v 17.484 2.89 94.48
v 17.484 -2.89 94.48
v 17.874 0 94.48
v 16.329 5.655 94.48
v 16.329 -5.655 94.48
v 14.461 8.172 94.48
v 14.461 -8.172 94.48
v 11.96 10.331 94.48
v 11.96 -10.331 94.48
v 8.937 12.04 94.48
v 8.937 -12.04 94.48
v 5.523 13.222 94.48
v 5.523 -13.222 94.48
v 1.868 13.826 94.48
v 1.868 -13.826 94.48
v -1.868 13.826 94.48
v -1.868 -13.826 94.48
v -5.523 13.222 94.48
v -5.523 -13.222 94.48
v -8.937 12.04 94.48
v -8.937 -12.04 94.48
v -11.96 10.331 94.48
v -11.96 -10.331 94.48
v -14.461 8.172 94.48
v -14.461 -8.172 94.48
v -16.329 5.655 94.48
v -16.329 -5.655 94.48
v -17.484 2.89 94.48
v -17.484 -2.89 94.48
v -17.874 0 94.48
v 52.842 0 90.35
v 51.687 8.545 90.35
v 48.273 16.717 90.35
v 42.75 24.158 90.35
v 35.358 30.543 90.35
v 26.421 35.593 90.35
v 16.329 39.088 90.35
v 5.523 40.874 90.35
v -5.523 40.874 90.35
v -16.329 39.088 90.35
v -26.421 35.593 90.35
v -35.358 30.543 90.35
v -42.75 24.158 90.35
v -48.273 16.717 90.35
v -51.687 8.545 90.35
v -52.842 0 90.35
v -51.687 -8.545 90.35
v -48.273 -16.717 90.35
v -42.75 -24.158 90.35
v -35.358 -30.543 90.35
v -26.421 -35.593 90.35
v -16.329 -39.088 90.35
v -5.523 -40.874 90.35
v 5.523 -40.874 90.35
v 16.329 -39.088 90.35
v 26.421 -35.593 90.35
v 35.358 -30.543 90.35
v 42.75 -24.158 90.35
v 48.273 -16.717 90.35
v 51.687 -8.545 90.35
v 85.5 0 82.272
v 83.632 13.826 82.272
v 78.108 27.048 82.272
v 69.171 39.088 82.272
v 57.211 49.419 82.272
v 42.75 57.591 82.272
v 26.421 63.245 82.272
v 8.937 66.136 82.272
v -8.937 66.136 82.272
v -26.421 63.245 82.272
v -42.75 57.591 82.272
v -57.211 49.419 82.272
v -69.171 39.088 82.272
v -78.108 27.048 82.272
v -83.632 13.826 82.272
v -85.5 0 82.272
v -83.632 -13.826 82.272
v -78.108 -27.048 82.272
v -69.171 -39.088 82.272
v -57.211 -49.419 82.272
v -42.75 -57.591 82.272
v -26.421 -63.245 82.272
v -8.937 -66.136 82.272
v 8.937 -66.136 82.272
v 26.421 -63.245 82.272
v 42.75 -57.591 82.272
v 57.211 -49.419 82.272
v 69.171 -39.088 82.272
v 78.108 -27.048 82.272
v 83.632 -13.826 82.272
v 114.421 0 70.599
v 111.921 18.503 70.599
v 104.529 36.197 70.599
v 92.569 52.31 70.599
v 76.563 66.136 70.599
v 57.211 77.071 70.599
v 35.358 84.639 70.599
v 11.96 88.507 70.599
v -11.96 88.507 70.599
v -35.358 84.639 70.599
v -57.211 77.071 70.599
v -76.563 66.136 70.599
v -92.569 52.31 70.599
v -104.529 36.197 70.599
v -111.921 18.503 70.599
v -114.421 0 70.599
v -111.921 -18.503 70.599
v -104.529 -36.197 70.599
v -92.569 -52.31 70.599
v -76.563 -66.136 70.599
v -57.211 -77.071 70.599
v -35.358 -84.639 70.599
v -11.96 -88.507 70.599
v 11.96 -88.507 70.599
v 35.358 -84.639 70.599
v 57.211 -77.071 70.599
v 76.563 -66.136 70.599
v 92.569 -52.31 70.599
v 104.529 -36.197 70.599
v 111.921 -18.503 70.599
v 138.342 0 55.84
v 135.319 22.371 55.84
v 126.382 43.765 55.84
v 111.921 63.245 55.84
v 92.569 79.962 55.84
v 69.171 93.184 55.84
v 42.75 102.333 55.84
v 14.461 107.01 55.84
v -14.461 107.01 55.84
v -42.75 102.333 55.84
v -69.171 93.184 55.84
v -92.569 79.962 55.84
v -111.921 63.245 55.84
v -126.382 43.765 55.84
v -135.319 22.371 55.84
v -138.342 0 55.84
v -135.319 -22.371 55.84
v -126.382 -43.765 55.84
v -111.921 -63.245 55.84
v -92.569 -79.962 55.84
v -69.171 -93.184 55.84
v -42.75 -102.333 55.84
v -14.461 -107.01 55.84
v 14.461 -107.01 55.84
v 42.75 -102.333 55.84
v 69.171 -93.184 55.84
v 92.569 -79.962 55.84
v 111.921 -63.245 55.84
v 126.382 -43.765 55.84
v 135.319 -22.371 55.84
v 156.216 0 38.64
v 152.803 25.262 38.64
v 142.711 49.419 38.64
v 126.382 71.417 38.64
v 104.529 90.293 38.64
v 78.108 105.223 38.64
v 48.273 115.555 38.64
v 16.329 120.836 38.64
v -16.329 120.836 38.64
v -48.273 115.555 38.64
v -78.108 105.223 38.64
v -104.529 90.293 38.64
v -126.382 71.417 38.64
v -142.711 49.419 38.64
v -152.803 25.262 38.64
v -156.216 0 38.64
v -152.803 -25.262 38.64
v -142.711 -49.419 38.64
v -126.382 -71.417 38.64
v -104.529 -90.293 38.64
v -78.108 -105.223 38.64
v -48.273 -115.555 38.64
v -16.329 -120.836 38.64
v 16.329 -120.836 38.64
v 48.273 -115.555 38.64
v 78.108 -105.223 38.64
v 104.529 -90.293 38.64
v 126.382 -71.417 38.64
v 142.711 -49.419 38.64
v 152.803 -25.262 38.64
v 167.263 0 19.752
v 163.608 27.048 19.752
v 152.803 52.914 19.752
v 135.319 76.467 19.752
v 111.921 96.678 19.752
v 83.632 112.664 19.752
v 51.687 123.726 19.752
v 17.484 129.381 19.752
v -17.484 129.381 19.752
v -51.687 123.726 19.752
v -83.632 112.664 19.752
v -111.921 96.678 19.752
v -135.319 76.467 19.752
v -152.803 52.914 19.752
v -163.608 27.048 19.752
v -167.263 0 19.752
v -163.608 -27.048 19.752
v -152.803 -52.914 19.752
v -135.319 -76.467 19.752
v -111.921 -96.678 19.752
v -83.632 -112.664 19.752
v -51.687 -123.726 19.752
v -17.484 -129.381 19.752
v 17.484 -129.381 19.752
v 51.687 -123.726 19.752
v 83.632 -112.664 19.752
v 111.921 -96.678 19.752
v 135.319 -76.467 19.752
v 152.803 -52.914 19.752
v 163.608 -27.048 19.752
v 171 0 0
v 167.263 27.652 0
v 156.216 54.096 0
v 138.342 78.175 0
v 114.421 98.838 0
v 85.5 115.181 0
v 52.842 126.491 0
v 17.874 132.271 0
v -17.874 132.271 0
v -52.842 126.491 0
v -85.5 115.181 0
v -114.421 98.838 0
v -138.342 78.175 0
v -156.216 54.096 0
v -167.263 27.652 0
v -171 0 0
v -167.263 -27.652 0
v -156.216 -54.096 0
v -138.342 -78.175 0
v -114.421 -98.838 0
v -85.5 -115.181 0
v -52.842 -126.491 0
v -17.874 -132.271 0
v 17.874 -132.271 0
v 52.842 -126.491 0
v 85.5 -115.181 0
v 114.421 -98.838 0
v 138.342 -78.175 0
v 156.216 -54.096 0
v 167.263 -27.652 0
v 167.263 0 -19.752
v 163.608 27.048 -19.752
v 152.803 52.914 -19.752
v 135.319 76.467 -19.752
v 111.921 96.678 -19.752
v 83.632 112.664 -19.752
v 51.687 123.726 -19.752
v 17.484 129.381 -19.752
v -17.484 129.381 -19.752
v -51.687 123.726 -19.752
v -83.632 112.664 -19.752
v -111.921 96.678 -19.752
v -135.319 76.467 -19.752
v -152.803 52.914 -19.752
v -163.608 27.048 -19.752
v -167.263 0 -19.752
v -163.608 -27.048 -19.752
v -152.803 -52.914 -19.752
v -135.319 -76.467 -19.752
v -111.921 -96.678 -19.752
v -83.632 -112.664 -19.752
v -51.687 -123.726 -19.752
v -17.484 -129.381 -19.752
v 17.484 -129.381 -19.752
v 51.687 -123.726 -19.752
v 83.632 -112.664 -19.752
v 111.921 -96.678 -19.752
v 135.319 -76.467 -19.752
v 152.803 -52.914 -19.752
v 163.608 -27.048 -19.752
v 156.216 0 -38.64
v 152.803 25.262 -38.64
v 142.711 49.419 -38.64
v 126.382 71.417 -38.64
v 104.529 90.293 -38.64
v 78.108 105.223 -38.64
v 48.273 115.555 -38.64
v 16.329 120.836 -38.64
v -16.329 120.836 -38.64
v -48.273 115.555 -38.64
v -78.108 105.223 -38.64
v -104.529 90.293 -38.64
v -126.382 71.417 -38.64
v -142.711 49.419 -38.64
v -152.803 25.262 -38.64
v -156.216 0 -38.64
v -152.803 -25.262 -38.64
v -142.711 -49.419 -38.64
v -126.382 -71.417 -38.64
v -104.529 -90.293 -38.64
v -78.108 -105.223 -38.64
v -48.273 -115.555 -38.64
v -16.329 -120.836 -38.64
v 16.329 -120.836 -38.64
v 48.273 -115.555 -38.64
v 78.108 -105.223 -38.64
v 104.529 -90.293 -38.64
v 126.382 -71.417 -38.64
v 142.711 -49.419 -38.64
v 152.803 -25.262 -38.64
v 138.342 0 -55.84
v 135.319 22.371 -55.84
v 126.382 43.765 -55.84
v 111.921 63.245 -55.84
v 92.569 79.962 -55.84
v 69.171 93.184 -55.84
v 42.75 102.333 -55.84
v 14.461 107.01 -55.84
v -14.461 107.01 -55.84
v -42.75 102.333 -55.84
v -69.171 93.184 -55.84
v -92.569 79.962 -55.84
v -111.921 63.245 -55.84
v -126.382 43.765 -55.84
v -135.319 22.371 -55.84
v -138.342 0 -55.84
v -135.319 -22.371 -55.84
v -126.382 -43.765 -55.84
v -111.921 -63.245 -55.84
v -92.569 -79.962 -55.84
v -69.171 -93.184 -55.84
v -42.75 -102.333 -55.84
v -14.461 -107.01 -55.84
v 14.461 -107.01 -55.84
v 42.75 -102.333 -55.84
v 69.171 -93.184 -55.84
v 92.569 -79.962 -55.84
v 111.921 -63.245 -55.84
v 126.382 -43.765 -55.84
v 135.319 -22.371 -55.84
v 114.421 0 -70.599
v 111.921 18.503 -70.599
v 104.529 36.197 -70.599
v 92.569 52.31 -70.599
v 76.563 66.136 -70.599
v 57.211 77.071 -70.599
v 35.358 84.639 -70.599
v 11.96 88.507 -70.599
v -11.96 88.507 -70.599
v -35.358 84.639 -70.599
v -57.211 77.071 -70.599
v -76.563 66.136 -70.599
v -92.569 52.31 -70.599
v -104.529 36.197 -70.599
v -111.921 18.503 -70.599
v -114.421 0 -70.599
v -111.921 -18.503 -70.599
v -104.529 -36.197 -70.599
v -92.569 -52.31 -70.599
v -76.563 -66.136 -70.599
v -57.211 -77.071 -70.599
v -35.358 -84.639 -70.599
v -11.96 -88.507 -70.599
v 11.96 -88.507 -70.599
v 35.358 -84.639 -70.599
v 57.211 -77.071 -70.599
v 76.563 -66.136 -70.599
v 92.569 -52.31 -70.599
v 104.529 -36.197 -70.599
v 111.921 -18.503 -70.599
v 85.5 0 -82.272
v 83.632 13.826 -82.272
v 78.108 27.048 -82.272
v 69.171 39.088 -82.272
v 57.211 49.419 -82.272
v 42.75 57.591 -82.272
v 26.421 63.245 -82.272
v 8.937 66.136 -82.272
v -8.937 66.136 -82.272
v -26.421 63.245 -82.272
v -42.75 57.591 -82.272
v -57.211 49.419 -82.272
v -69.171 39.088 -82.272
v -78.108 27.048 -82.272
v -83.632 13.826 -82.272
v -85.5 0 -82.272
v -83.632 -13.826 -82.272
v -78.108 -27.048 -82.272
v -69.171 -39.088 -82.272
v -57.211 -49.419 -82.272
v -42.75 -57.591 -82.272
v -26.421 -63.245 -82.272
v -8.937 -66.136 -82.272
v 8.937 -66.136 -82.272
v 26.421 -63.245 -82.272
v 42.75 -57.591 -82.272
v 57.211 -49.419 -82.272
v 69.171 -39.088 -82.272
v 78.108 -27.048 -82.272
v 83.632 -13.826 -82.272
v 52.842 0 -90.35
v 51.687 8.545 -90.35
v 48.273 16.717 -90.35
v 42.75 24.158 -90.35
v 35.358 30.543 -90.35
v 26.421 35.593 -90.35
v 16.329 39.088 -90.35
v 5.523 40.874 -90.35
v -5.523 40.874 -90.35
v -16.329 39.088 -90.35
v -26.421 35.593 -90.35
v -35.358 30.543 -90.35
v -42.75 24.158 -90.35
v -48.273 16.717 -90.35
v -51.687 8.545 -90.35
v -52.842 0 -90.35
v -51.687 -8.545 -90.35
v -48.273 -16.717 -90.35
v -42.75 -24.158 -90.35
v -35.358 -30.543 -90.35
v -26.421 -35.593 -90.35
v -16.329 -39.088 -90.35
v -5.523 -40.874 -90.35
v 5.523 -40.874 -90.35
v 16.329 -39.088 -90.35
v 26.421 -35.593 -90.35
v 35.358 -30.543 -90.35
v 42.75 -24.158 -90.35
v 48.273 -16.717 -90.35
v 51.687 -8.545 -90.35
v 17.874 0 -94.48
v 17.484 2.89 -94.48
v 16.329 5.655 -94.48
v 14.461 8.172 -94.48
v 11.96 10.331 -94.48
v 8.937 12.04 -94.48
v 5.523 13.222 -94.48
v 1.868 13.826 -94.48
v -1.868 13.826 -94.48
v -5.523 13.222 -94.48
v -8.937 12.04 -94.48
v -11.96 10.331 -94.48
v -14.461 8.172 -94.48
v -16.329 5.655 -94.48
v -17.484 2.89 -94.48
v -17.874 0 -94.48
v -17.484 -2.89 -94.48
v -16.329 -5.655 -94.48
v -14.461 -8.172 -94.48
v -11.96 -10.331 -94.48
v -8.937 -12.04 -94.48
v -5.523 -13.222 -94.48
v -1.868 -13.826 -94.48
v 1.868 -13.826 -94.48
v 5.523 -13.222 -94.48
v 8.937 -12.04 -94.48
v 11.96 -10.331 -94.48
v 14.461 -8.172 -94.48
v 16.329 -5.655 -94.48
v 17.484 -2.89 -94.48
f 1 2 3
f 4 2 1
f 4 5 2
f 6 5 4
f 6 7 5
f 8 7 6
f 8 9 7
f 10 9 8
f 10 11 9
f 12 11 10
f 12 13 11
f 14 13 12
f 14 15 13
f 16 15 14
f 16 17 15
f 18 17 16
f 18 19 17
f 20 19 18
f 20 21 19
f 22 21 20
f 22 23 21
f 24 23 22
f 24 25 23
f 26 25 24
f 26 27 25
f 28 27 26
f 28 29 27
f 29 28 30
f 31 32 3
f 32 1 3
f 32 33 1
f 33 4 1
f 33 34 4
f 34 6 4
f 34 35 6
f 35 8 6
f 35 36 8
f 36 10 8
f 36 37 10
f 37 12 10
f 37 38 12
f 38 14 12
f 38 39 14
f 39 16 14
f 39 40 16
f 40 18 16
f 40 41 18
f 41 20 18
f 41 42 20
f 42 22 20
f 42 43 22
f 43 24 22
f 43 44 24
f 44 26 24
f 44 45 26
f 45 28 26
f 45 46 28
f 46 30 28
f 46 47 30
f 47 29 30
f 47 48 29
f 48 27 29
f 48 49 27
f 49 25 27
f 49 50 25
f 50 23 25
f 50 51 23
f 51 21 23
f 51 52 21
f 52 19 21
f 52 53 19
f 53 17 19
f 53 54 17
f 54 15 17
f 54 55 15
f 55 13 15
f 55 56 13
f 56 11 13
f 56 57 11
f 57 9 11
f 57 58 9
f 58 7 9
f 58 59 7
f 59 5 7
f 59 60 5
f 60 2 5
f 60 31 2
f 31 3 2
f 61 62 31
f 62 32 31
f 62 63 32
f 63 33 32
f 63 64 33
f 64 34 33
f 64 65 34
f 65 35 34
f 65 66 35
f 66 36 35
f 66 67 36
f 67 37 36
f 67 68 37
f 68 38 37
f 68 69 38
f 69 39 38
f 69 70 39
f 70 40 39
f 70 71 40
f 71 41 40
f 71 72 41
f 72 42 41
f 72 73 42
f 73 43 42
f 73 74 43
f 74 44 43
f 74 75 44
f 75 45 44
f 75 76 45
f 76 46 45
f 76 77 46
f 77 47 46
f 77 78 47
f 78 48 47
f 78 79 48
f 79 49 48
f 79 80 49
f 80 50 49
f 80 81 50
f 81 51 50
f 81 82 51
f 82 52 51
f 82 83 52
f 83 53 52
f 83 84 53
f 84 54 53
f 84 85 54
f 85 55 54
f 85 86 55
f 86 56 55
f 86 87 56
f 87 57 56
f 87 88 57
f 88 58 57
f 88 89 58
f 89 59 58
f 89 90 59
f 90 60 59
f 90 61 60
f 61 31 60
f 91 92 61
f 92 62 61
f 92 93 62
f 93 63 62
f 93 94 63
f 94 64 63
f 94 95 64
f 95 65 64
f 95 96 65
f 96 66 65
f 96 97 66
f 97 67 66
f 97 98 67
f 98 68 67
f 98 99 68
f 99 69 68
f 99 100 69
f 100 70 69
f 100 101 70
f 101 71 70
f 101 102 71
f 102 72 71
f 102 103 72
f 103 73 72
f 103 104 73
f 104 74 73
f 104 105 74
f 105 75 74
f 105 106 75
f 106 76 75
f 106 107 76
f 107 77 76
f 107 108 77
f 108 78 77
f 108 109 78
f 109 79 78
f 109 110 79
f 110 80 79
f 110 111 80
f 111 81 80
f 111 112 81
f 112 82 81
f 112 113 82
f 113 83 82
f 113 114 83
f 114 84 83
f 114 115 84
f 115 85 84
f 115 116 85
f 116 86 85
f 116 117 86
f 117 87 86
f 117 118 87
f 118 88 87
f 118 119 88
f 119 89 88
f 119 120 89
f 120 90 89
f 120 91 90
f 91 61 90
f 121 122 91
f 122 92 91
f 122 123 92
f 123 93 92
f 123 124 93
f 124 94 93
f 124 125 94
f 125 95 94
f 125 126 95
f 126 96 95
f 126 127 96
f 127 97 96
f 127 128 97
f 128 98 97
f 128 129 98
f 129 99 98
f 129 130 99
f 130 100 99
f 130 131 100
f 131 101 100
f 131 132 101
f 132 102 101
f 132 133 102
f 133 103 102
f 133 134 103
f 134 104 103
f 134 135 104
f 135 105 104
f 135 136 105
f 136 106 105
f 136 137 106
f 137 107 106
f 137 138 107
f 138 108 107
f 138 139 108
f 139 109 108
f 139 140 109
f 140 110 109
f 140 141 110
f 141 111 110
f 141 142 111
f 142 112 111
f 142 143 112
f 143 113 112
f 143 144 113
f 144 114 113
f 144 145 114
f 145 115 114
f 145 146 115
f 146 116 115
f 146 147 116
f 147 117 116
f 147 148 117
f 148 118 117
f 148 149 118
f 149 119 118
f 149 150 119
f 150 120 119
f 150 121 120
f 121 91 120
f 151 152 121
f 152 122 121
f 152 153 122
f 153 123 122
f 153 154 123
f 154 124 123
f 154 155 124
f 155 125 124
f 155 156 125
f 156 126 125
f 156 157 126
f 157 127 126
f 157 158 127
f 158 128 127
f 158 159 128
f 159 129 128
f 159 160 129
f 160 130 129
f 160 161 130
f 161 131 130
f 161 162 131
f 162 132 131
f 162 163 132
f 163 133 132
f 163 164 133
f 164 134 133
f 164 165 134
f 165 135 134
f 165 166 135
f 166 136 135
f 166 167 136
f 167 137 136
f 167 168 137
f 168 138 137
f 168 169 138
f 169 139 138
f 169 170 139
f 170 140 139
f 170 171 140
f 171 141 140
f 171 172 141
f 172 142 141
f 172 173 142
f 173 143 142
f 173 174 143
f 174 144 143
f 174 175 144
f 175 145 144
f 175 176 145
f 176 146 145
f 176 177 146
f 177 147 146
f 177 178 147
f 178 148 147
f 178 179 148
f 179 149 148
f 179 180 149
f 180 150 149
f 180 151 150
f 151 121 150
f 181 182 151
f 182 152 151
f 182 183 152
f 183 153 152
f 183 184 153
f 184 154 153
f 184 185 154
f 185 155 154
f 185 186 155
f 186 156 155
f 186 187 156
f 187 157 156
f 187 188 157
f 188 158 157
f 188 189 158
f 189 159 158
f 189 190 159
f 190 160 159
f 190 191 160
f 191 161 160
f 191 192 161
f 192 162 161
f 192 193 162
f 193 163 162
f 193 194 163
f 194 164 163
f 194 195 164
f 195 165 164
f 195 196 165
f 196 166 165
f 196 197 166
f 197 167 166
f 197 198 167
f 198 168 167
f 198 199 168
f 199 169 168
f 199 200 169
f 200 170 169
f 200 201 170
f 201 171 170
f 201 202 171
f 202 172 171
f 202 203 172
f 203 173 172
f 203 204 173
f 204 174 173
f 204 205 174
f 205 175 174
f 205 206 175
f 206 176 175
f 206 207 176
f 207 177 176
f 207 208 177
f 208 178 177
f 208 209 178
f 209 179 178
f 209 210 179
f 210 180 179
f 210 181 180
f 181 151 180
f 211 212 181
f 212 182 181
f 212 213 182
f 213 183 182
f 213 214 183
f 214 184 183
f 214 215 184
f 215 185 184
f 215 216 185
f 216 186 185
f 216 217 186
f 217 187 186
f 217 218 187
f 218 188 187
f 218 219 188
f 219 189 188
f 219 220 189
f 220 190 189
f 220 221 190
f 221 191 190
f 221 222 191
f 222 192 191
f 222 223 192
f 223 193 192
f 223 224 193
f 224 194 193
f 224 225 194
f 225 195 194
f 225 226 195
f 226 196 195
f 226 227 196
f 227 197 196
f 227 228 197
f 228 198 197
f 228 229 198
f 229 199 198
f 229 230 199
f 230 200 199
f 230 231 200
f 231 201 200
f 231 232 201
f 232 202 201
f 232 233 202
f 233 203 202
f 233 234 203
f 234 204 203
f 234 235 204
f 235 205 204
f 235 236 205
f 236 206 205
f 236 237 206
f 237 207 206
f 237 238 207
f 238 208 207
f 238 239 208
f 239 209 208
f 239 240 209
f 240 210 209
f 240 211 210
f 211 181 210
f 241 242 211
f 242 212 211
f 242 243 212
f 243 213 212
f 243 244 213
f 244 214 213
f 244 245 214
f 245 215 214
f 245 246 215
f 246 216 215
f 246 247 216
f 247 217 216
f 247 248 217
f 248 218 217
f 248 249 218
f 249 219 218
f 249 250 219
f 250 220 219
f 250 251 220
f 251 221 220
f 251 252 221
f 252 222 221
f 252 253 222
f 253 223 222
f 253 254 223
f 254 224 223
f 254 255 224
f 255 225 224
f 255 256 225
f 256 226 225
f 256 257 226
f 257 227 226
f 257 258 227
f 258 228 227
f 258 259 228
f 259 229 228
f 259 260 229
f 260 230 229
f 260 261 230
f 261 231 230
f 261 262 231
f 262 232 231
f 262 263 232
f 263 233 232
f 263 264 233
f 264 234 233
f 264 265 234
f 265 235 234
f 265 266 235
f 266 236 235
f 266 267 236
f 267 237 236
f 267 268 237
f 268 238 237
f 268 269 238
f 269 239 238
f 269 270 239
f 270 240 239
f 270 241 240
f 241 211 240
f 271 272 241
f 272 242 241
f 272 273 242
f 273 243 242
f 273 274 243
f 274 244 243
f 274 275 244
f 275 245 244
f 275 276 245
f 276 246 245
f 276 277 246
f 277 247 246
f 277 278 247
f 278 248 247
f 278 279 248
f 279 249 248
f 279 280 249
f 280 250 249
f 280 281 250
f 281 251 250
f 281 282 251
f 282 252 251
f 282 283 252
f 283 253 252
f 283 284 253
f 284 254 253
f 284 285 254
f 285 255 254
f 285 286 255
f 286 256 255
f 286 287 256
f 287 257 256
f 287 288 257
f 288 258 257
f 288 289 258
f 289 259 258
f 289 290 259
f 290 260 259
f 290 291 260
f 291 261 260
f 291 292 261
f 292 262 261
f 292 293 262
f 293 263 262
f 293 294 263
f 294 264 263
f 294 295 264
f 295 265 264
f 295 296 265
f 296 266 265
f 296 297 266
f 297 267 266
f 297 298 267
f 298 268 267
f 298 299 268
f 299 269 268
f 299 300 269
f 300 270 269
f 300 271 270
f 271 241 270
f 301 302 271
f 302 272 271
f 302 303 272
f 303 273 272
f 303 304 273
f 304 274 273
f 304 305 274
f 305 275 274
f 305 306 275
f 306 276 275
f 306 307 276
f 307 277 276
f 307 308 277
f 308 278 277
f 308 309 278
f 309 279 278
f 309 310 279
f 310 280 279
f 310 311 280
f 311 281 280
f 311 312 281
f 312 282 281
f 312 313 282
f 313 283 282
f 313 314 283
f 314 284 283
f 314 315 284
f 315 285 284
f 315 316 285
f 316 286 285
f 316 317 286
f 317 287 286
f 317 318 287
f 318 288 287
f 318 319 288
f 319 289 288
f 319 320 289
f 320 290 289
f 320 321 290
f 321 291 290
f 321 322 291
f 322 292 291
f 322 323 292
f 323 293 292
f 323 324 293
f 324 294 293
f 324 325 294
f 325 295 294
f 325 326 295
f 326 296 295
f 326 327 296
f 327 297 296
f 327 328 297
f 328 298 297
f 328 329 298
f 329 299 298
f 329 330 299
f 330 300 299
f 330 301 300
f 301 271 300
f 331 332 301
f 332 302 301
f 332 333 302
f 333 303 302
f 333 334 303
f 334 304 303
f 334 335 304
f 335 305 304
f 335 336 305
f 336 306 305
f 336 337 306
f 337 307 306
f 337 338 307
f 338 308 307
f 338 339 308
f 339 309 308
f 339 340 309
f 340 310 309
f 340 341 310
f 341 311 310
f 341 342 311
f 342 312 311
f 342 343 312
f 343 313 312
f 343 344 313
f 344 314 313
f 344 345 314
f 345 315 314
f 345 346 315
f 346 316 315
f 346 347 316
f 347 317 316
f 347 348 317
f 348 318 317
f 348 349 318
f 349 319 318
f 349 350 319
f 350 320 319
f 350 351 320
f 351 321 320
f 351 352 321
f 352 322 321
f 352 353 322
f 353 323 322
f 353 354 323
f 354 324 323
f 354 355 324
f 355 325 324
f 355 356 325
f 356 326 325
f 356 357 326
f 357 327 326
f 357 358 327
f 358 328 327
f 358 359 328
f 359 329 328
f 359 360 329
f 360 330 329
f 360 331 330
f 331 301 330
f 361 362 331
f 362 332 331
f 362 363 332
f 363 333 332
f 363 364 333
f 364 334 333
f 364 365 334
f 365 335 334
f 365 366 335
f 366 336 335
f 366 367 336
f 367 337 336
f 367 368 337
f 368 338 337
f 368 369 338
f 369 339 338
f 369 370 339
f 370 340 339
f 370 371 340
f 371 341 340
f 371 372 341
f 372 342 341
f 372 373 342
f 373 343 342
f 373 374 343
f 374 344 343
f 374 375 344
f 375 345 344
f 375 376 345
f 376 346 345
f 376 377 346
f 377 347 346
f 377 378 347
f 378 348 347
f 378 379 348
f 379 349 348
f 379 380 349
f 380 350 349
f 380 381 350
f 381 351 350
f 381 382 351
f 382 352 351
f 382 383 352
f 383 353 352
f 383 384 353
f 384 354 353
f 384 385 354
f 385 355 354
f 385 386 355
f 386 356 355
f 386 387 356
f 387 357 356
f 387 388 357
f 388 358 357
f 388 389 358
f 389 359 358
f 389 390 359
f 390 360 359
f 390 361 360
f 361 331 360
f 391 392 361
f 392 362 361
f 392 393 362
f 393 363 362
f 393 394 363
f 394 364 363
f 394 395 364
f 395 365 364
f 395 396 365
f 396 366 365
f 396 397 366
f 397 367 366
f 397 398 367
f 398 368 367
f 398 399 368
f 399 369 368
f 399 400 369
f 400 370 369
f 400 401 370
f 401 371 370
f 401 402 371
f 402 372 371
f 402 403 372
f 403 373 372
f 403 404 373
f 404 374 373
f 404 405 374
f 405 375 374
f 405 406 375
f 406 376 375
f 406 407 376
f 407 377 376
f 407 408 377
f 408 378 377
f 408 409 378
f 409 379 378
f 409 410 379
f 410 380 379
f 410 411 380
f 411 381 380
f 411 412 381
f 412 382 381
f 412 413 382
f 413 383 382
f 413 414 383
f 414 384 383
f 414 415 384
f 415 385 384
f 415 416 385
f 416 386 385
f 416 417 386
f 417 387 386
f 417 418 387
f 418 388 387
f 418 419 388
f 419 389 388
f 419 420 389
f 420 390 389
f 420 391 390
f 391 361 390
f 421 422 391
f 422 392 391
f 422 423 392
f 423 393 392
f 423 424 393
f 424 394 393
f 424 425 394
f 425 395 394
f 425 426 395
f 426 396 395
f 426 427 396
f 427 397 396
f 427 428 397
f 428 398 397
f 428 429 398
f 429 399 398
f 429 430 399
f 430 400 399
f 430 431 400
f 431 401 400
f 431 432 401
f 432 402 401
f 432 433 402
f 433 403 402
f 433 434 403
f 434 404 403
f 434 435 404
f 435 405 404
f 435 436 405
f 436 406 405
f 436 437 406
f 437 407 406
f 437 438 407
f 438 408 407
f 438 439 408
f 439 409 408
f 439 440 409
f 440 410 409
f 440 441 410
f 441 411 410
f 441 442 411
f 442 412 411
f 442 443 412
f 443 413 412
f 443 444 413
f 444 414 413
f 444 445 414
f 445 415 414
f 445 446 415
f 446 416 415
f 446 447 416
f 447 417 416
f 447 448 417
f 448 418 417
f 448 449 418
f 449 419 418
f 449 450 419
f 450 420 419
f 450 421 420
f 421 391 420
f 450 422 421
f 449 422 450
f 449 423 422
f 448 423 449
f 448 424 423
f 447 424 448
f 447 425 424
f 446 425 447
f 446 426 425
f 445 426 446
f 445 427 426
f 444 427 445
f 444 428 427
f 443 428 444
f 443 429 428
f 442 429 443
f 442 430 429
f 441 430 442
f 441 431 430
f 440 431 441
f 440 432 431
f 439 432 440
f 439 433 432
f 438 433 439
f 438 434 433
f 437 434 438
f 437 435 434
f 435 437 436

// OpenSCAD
// Generated by SolidPython 1.0.1 on 2020-07-29 00:46:48


scale(v = [9, 7, 5]) {
	sphere(r = 19);
}
/***********************************************
*********      SolidPython code:      **********
************************************************
 
# import packages: SolidPython
from solid import *
from solid.utils import *
from itertools import chain, combinations, permutations


class Resize:

    def __init__(self, scad_file):
        self.scad_file = scad_file
        #self.scad_file = import_scad(scad_file)
        # cone/cylinder param:
        self.r1 = 0
        self.r2 = 0
        self.h = 0
        # rectangular prism param:
        self.w = 0
        self.l = 0
        # ellipse param:
        self.r = 0

    # import OpenScad code (file name corresponds to shape)


    # classify shape + parameters
    def assign(self, param1, param2, param3):
        if self.scad_file == 'cone.scad':
            self.r1 = param1
            self.r2 = param2
            self.h = param3
        elif self.scad_file == 'cylinder.scad':
            self.r1 = param1
            self.r2 = param2
            self.h = param3
        elif self.scad_file == 'rectangularPrism.scad':
            self.h = param1
            self.l = param2
            self.w = param3
        else:
            self.r = param1
            self.h = param2

    # resize parameters
    def iterate(self):
        x = range(3, 20, 2)
        i = 1
        if self.scad_file == 'cone.scad':
            tempList = list(permutations(x, 2))
            for temp in tempList:
                param1 = temp[0]
                param2 = temp[1]
                filepath = 'produced_scad_files/' + 'cone' + str(param1) + '_' + str(param2) + '_' + '.scad'
                scad_render_to_file(cylinder(h=param1, r1=param2, r2=0), filepath)

        elif self.scad_file == 'cylinder.scad':
            tempList = list(permutations(x, 3))
            for temp in tempList:
                param1 = temp[0]
                param2 = temp[1]
                filepath = 'produced_scad_files/' + 'cylinder' + str(param1) + '_' + str(param2) + '_' + '.scad'
                scad_render_to_file(cylinder(h=param1, r1=param2, r2=param2), filepath)

        elif self.scad_file == 'rectangularPrism.scad':
            tempList = list(permutations(x, 3))
            for temp in tempList:
                param1 = temp[0]
                param2 = temp[1]
                param3 = temp[2]
                filepath = 'produced_scad_files/' + 'rectangularPrism' + str(param1) + '_' + str(param2) + '_' + str(
                    param3) + '.scad'
                scad_render_to_file(cube(size=(param1, param2, param3)), filepath)

        elif self.scad_file == 'ellipse.scad':
            tempList = list(permutations(x, 4))
            for temp in tempList:
                param1 = temp[0]
                param2 = temp[1]
                param3 = temp[2]
                param4 = temp[3]
                filepath = 'produced_scad_files/' + 'ellipse' + str(param1) + '_' + str(param2) + '_' + str(param3) + '_' + str(param4) + '.scad'
                scad_render_to_file(scale([param1, param2, param3])(sphere(r=param4)), filepath)

    def render_to_scadfile(self):
        scad_render_to_file(scad, 'example.scad') 
 
************************************************/
